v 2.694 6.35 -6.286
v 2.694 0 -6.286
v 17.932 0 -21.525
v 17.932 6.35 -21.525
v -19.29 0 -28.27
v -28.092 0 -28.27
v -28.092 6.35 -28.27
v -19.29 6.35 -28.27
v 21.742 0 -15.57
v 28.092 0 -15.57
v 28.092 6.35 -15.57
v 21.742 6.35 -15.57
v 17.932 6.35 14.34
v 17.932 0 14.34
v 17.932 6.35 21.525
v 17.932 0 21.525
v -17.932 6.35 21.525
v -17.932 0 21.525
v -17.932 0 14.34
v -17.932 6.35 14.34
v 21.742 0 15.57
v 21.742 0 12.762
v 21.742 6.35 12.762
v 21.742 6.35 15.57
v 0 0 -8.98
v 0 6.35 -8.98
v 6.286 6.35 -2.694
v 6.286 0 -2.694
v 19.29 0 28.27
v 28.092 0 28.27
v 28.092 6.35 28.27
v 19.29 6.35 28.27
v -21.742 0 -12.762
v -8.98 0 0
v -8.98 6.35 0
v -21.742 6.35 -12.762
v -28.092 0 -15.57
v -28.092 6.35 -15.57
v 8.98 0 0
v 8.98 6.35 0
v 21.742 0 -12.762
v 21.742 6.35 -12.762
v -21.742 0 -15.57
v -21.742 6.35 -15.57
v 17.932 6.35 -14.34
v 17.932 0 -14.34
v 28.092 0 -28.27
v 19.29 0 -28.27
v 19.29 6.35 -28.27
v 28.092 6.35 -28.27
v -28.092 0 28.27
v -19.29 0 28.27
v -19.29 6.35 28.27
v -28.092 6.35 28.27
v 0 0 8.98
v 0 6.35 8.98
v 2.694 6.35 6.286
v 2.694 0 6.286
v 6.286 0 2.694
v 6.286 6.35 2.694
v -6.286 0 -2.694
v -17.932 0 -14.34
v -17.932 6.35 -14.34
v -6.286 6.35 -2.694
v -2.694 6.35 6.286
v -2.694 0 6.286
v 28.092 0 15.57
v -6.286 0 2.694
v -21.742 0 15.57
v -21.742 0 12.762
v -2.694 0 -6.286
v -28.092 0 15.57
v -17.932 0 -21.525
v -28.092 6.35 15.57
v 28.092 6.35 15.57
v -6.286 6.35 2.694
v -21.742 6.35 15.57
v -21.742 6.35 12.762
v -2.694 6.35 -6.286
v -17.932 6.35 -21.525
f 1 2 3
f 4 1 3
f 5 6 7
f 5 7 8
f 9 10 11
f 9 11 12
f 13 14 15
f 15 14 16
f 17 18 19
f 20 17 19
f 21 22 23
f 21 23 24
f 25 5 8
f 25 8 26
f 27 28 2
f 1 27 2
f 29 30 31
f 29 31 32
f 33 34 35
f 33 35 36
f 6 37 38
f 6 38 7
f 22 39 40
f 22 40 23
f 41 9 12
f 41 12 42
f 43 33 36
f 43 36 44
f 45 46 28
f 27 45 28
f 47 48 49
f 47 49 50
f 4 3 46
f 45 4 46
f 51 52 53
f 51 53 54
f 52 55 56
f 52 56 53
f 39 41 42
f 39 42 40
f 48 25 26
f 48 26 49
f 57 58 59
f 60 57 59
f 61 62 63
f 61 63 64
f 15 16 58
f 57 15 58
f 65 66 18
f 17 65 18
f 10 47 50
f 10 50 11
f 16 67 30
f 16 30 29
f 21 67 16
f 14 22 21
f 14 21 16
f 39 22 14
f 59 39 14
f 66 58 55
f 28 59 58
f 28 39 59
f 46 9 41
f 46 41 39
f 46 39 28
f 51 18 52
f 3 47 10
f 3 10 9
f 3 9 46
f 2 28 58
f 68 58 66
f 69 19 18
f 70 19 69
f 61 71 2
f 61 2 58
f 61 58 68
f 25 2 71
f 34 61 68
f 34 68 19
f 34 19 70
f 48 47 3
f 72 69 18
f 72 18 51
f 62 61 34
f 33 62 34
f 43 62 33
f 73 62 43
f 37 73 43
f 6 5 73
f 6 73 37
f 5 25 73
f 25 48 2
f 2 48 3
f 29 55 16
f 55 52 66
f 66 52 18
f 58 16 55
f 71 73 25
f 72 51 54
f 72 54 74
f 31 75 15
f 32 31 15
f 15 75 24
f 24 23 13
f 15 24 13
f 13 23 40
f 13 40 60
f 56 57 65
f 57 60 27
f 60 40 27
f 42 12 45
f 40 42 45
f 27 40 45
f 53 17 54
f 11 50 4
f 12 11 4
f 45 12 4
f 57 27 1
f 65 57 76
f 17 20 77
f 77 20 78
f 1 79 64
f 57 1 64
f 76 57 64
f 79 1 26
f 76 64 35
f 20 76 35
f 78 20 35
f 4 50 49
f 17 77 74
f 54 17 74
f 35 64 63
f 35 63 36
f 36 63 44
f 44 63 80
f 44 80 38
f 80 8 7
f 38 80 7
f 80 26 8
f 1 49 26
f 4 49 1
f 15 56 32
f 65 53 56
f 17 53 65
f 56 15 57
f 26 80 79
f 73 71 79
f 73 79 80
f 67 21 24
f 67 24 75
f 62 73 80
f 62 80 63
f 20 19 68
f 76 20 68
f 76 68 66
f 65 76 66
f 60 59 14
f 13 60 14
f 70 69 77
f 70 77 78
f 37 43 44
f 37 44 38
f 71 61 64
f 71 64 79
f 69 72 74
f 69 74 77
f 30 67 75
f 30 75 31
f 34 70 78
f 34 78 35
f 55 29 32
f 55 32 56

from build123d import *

# Parameters (mm, degrees)
BOSS_EXTRUDE1_DEPTH = 6.35


with BuildPart() as part:
    # Sketch1 → Boss-Extrude1 (new body)
    with BuildSketch(Plane(origin=(0, 0, 0), x_dir=(1, 0, 0), z_dir=(0, 1, 0))):
        Polygon((-28.0924, 15.5702), (-28.0924, 28.2702), (-19.289943879, 28.2702), (0, 8.980256121), (19.289943879, 28.2702), (28.0924, 28.2702), (28.0924, 15.5702), (21.7424, 15.5702), (21.7424, 12.762143879), (8.980256121, 0), (21.7424, -12.762143879), (21.7424, -15.5702), (28.0924, -15.5702), (28.0924, -28.2702), (19.289943879, -28.2702), (0, -8.980256121), (-19.289943879, -28.2702), (-28.0924, -28.2702), (-28.0924, -15.5702), (-21.7424, -15.5702), (-21.7424, -12.762143879), (-8.980256121, 0), (-21.7424, 12.762143879), (-21.7424, 15.5702), align=None)
        Polygon((6.286179285, 2.694076836), (2.694076836, 6.286179285), (17.9324, 21.524502448), (17.9324, 14.340297552), align=None, mode=Mode.SUBTRACT)
        Polygon((2.694076836, -6.286179285), (6.286179285, -2.694076836), (17.9324, -14.340297552), (17.9324, -21.524502448), align=None, mode=Mode.SUBTRACT)
        Polygon((-6.286179285, 2.694076836), (-2.694076836, 6.286179285), (-17.9324, 21.524502448), (-17.9324, 14.340297552), align=None, mode=Mode.SUBTRACT)
        Polygon((-6.286179285, -2.694076836), (-2.694076836, -6.286179285), (-17.9324, -21.524502448), (-17.9324, -14.340297552), align=None, mode=Mode.SUBTRACT)
    extrude(amount=BOSS_EXTRUDE1_DEPTH)


solid = part.part
